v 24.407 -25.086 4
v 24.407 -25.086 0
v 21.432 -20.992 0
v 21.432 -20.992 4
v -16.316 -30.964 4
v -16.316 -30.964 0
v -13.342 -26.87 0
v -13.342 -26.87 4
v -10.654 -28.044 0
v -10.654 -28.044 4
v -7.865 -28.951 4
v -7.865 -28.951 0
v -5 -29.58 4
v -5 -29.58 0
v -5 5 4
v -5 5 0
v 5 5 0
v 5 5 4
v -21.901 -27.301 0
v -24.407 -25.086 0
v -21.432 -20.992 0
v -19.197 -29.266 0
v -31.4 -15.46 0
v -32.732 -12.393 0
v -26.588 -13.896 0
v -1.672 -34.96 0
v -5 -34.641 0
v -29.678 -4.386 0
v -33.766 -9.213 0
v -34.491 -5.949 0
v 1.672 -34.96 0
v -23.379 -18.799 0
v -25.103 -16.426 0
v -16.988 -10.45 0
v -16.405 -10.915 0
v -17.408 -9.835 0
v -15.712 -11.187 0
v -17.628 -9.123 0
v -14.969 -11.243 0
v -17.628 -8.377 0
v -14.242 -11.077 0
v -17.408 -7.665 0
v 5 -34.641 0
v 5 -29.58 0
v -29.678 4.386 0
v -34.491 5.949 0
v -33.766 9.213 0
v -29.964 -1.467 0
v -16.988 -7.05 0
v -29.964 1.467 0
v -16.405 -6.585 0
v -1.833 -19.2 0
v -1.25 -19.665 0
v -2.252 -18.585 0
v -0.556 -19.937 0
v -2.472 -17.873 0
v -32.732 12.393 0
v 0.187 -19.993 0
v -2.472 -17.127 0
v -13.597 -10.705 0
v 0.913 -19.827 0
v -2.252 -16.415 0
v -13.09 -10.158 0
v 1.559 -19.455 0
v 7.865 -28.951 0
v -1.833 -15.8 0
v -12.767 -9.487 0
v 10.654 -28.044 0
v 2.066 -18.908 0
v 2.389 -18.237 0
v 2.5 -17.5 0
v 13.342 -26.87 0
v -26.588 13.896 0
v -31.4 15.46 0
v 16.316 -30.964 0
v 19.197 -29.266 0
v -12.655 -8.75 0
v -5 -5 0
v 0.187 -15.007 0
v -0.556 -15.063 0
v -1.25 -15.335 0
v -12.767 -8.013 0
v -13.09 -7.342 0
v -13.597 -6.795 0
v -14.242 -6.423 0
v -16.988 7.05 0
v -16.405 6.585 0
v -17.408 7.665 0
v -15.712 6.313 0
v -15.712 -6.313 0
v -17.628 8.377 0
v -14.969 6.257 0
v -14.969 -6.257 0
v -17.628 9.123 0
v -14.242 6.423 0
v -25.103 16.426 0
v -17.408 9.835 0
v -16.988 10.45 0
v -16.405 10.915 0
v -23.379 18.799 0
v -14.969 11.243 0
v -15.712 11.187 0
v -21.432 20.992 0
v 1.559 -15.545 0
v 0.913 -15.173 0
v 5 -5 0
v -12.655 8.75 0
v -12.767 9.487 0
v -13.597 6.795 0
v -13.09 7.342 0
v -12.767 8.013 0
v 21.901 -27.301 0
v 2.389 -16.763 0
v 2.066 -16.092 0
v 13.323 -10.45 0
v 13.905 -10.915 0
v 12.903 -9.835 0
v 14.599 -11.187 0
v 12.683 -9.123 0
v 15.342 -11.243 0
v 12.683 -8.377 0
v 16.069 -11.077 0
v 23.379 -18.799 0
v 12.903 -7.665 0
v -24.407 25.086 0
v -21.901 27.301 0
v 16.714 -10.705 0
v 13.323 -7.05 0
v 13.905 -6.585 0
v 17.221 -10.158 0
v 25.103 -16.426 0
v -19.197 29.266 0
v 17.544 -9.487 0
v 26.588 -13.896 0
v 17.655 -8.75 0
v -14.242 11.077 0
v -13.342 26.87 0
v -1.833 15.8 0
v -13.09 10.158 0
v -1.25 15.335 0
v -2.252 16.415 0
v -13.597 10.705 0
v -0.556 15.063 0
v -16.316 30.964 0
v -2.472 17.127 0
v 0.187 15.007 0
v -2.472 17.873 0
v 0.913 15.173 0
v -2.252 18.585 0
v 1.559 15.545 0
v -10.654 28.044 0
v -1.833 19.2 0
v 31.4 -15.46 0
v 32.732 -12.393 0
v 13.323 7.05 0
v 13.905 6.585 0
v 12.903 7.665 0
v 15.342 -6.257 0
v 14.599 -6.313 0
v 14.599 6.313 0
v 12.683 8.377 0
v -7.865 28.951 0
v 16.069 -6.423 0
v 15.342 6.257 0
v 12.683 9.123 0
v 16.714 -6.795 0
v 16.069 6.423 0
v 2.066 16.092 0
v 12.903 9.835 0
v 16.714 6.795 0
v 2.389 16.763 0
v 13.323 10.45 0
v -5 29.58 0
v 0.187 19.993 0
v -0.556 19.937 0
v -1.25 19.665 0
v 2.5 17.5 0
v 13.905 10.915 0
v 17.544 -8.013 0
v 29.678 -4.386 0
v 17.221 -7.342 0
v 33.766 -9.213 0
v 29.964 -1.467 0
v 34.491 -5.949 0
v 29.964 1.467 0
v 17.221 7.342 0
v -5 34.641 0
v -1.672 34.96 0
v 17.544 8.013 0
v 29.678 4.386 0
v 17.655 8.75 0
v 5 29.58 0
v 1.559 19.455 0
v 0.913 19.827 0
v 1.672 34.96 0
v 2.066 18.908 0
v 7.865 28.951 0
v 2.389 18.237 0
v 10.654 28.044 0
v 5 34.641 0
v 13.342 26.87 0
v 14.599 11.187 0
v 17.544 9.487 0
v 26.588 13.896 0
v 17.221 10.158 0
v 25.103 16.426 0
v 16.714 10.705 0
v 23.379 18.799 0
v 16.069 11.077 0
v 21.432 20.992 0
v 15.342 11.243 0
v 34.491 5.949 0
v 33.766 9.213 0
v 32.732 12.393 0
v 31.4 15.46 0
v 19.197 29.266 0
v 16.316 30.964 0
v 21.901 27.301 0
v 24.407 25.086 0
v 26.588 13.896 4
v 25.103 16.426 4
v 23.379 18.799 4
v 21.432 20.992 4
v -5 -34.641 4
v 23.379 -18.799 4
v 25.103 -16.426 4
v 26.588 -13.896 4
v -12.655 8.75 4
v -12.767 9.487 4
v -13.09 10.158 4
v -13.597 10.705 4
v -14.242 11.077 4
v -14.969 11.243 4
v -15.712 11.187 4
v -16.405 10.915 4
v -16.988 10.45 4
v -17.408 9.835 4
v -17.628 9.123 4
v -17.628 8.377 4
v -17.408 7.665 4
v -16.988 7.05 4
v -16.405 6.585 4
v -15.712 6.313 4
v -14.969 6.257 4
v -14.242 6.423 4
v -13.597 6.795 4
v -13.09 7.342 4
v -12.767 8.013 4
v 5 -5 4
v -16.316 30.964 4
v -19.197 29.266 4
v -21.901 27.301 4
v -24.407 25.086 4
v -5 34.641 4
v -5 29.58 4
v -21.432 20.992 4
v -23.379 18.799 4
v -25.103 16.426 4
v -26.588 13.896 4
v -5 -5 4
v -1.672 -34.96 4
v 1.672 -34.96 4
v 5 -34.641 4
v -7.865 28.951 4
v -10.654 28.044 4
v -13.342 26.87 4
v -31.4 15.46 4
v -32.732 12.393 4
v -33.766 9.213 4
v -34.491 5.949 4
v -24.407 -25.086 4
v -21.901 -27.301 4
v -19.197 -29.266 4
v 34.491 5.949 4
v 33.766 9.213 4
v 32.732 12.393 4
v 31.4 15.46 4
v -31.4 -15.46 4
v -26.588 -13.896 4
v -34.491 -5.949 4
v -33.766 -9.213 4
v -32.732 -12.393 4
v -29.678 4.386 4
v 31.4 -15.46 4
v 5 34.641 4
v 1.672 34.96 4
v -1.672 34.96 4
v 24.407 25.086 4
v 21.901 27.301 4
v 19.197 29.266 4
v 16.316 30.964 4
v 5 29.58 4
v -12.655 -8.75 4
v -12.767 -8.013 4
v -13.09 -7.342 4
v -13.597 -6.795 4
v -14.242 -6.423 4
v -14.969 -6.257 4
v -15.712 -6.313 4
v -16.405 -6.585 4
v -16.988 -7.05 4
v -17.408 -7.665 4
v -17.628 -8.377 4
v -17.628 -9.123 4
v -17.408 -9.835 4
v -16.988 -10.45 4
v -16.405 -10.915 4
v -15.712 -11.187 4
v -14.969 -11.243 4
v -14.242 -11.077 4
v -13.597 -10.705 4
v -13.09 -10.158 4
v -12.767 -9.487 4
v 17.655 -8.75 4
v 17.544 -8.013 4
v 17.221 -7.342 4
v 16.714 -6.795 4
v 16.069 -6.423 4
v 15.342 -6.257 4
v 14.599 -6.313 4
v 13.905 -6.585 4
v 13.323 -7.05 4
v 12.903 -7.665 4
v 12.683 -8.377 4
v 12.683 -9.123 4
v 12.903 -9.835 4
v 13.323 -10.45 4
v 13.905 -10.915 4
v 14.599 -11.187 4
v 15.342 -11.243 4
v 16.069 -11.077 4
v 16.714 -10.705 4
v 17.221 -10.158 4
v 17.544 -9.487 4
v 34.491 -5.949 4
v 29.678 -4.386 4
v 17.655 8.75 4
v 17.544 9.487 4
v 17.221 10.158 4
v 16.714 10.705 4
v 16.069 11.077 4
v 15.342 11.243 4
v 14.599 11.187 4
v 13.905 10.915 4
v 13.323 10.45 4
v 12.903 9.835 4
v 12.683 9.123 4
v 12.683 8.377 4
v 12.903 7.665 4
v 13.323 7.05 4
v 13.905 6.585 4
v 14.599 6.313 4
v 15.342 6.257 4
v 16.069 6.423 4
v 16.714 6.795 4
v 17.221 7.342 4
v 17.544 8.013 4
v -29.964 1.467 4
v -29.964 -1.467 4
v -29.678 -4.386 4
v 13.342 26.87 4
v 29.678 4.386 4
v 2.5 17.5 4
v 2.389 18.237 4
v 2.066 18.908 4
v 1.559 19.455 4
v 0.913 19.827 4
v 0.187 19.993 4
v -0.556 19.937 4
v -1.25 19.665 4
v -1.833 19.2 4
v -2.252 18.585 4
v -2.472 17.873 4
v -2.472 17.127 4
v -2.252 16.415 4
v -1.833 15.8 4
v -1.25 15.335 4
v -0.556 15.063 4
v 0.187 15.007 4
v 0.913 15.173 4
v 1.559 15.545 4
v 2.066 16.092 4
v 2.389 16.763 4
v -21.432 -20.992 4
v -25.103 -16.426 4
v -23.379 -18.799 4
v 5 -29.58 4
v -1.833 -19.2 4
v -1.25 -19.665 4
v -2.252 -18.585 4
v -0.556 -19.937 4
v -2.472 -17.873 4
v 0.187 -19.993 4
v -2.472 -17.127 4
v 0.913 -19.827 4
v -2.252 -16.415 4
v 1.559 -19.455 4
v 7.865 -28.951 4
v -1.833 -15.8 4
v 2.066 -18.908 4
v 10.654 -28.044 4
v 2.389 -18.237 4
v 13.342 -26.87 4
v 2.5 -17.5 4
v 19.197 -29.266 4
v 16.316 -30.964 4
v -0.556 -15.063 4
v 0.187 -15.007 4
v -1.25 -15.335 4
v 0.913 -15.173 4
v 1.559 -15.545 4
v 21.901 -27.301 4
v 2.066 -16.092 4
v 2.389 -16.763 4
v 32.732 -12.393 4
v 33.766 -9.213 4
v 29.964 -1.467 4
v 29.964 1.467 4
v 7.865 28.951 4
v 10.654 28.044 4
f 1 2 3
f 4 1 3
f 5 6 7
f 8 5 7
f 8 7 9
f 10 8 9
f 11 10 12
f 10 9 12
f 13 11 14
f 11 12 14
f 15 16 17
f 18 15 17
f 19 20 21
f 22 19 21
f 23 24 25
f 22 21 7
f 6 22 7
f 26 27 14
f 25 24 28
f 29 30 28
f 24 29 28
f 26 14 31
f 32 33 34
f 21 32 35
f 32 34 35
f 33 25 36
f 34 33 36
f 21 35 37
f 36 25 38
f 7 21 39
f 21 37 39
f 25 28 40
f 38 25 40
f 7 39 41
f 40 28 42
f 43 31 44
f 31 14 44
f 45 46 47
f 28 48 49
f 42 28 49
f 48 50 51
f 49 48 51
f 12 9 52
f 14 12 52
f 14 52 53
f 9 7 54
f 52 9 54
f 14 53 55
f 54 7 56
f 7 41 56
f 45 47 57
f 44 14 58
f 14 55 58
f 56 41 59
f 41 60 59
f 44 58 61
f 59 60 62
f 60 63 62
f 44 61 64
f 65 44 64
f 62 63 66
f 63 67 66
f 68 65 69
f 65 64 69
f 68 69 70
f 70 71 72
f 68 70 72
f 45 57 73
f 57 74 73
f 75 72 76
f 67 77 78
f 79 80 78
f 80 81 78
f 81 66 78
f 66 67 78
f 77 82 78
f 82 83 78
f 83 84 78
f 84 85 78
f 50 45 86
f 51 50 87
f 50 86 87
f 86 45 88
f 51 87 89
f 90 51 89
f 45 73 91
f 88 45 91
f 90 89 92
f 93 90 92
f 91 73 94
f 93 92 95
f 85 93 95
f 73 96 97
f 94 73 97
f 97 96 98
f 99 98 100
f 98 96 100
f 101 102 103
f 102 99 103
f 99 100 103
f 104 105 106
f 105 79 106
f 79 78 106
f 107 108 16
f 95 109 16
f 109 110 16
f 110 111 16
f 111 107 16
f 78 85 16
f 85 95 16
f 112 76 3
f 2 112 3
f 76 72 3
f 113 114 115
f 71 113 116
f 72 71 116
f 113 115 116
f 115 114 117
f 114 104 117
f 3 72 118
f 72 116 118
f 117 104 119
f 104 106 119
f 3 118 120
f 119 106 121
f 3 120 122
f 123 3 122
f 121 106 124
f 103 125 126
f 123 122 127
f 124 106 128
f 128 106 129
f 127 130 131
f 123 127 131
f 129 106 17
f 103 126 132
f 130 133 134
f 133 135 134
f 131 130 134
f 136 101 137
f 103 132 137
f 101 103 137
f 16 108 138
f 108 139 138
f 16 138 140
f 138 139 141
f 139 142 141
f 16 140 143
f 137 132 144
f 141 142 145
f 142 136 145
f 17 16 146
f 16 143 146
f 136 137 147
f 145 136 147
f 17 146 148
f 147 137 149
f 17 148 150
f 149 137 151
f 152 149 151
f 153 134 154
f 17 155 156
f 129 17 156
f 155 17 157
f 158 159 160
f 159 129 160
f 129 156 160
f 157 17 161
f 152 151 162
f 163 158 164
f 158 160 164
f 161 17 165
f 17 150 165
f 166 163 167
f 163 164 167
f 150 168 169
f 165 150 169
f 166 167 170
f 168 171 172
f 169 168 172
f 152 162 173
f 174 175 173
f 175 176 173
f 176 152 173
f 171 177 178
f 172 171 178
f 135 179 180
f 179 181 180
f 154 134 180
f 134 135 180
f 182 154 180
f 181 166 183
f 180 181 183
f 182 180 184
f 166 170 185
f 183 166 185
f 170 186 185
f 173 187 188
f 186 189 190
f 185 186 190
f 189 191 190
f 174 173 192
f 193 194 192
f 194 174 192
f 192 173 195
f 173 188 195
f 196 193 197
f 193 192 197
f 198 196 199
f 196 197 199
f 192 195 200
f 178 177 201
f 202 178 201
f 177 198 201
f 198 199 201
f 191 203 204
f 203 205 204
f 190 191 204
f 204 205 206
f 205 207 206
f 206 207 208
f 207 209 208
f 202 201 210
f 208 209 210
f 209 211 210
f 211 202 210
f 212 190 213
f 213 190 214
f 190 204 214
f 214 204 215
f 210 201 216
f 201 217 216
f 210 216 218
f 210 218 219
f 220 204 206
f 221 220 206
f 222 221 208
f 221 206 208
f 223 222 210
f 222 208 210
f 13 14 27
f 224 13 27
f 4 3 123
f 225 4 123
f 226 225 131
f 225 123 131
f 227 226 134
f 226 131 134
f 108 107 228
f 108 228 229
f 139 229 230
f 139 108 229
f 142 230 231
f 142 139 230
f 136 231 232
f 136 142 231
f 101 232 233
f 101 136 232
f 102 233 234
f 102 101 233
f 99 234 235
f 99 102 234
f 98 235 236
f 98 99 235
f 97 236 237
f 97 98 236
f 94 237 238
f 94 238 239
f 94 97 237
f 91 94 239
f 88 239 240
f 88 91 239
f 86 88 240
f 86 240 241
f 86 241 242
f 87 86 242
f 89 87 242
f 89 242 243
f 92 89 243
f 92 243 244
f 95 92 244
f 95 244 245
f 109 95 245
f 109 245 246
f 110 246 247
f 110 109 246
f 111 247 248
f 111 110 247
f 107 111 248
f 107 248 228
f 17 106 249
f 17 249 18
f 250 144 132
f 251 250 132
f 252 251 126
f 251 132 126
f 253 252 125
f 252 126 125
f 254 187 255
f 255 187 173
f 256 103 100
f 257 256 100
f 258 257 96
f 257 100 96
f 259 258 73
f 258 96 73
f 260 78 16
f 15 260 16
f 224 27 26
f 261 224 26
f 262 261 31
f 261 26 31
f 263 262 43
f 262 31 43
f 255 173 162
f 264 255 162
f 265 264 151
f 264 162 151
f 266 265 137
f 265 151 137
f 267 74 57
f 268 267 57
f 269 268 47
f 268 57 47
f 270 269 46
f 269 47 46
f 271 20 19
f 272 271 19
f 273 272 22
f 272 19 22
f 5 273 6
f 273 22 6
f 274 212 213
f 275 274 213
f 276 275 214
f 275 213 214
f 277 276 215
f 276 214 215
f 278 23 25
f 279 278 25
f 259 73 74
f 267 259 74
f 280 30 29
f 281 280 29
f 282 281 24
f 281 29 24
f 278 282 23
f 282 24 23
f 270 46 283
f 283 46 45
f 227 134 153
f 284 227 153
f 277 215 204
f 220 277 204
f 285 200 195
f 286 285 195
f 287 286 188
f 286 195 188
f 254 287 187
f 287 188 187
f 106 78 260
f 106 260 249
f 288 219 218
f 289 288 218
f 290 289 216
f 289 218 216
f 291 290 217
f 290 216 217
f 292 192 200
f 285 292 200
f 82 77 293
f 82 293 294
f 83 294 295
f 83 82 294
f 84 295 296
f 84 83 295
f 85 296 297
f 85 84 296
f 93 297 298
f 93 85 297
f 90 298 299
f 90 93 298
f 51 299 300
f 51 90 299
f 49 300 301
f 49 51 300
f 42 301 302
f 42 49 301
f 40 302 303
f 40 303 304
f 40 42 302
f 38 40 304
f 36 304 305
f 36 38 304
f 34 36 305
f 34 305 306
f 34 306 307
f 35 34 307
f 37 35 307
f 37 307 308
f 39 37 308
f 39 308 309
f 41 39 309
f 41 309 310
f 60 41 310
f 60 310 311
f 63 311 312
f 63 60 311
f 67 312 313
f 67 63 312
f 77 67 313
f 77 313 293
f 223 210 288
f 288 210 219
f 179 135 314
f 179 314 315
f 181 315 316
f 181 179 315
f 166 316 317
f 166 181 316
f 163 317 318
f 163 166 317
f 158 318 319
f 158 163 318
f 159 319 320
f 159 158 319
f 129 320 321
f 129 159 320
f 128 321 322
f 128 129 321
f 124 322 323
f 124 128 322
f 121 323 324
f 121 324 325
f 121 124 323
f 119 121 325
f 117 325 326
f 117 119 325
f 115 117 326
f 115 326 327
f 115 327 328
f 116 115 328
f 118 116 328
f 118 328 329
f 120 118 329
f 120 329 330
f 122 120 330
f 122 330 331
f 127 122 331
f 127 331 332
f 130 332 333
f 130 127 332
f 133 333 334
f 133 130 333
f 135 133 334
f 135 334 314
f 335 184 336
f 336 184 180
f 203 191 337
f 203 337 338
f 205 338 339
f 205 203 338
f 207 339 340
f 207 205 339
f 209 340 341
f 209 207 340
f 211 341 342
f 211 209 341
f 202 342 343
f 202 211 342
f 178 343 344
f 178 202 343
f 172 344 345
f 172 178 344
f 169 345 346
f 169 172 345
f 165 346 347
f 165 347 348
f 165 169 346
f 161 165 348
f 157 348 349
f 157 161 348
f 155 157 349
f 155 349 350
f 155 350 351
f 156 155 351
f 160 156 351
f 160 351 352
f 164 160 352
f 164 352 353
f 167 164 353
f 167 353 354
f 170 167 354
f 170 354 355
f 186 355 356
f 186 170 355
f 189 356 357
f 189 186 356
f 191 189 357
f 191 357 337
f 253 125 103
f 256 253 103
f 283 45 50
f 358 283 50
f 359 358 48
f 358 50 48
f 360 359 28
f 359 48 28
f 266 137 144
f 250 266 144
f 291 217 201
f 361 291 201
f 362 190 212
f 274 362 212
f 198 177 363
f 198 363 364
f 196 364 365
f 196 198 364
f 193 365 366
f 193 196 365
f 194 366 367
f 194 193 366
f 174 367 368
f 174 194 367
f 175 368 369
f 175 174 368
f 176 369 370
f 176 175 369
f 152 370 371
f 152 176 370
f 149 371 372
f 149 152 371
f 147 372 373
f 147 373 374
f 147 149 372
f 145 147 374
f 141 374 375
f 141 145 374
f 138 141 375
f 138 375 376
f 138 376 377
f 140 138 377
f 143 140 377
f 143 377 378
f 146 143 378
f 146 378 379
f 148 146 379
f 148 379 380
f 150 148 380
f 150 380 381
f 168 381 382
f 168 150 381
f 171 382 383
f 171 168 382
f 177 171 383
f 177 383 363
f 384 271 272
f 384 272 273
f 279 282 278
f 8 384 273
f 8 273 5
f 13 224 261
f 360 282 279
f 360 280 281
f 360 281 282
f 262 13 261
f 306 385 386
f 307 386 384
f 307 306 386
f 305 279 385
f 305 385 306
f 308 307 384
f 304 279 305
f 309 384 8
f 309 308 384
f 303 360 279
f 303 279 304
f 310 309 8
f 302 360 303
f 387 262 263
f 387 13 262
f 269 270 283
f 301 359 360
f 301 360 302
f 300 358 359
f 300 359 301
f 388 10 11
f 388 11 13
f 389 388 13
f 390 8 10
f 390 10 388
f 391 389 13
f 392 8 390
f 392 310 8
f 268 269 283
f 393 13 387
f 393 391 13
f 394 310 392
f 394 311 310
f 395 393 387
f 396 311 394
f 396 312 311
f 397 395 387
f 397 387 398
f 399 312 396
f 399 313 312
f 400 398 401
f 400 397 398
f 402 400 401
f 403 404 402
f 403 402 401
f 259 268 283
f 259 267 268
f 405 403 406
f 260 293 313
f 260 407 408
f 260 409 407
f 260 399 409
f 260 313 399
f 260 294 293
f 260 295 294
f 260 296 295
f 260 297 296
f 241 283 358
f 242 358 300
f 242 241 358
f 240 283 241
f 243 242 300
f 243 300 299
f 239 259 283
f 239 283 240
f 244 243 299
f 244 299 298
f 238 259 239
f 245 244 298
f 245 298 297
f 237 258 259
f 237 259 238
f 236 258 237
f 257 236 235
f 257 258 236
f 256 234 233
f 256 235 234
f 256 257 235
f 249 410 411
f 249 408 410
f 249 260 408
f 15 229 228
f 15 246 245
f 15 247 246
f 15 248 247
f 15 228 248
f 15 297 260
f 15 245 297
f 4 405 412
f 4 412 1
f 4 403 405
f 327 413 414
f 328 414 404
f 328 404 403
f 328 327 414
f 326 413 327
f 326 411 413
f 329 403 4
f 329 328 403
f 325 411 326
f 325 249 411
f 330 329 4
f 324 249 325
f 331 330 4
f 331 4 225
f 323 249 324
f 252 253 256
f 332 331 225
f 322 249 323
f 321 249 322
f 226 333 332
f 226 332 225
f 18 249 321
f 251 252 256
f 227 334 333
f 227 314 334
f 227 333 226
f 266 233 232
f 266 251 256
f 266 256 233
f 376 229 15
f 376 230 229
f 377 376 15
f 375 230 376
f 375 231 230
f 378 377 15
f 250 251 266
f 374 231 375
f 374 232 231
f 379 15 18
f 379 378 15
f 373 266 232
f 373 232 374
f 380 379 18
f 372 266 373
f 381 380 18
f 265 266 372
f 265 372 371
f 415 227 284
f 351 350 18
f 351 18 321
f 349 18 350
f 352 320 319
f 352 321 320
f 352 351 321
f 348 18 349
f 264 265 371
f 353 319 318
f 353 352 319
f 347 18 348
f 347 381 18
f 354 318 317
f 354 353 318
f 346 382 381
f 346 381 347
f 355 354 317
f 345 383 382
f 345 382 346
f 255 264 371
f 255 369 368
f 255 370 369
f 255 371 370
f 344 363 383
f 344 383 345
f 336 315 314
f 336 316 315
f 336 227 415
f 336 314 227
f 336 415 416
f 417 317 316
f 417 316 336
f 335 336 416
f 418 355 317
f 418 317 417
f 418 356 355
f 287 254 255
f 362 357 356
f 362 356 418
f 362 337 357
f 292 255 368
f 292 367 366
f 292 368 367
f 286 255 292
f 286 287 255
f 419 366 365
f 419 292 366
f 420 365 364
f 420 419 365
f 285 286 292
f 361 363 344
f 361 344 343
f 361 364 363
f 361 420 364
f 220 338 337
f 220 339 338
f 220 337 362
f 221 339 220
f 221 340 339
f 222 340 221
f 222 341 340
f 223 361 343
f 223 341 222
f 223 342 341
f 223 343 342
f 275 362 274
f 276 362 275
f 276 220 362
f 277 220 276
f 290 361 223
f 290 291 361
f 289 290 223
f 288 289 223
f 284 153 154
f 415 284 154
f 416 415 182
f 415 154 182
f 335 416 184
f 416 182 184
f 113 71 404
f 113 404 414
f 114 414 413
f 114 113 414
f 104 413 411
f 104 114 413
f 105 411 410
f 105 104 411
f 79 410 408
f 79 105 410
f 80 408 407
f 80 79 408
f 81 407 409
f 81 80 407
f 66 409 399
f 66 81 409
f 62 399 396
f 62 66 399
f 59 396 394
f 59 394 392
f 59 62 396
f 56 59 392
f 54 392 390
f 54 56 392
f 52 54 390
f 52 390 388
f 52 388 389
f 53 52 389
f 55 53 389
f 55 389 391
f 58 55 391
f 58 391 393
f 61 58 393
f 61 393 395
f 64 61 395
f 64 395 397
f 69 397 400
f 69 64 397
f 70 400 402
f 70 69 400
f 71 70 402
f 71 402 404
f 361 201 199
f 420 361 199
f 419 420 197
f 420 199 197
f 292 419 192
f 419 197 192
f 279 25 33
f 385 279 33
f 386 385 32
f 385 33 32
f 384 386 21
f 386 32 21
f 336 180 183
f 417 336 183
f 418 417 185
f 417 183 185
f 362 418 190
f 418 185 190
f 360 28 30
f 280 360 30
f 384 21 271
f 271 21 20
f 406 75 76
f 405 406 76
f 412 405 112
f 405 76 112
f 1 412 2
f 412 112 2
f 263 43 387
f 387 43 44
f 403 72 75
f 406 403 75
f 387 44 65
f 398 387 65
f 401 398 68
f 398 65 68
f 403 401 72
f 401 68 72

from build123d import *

# Parameters (mm, degrees)
SKETCH1_R           = 2.5
SKETCH1_W           = 10
SKETCH1_H           = 10
BOSS_EXTRUDE1_DEPTH = 4


with BuildPart() as part:
    # Sketch1 → Boss-Extrude1 (new body)
    with BuildSketch(Plane.XY):
        with BuildLine():
            Line((5, 29.580398915), (5, 34.641016151))
            ThreePointArc((5, 34.641016151), (0, 35), (-5, 34.641016151))
            Line((-5, 34.641016151), (-5, 29.580398915))
            ThreePointArc((-5, 29.580398915), (-9.270509831, 28.531695489), (-13.341837268, 26.869971684))
            Line((-13.341837268, 26.869971684), (-16.316393446, 30.96409703))
            ThreePointArc((-16.316393446, 30.96409703), (-20.57248383, 28.315594803), (-24.40656339, 25.086244507))
            Line((-24.40656339, 25.086244507), (-21.432007211, 20.992119162))
            ThreePointArc((-21.432007211, 20.992119162), (-24.270509831, 17.633557569), (-26.587546171, 13.896128547))
            Line((-26.587546171, 13.896128547), (-31.40047917, 15.459945275))
            ThreePointArc((-31.40047917, 15.459945275), (-33.28697807, 10.815594803), (-34.490649114, 5.949380112))
            Line((-34.490649114, 5.949380112), (-29.677716115, 4.385563384))
            ThreePointArc((-29.677716115, 4.385563384), (-30, 0), (-29.677716115, -4.385563384))
            Line((-29.677716115, -4.385563384), (-34.490649114, -5.949380112))
            ThreePointArc((-34.490649114, -5.949380112), (-33.28697807, -10.815594803), (-31.40047917, -15.459945275))
            Line((-31.40047917, -15.459945275), (-26.587546171, -13.896128547))
            ThreePointArc((-26.587546171, -13.896128547), (-24.270509831, -17.633557569), (-21.432007211, -20.992119162))
            Line((-21.432007211, -20.992119162), (-24.40656339, -25.086244507))
            ThreePointArc((-24.40656339, -25.086244507), (-20.57248383, -28.315594803), (-16.316393446, -30.96409703))
            Line((-16.316393446, -30.96409703), (-13.341837268, -26.869971684))
            ThreePointArc((-13.341837268, -26.869971684), (-9.270509831, -28.531695489), (-5, -29.580398915))
            Line((-5, -29.580398915), (-5, -34.641016151))
            ThreePointArc((-5, -34.641016151), (0, -35), (5, -34.641016151))
            Line((5, -34.641016151), (5, -29.580398915))
            ThreePointArc((5, -29.580398915), (9.270509831, -28.531695489), (13.341837268, -26.869971684))
            Line((13.341837268, -26.869971684), (16.316393446, -30.96409703))
            ThreePointArc((16.316393446, -30.96409703), (20.57248383, -28.315594803), (24.40656339, -25.086244507))
            Line((24.40656339, -25.086244507), (21.432007211, -20.992119162))
            ThreePointArc((21.432007211, -20.992119162), (24.270509831, -17.633557569), (26.587546171, -13.896128547))
            Line((26.587546171, -13.896128547), (31.40047917, -15.459945275))
            ThreePointArc((31.40047917, -15.459945275), (33.28697807, -10.815594803), (34.490649114, -5.949380112))
            Line((34.490649114, -5.949380112), (29.677716115, -4.385563384))
            ThreePointArc((29.677716115, -4.385563384), (30, 0), (29.677716115, 4.385563384))
            Line((29.677716115, 4.385563384), (34.490649114, 5.949380112))
            ThreePointArc((34.490649114, 5.949380112), (33.28697807, 10.815594803), (31.40047917, 15.459945275))
            Line((31.40047917, 15.459945275), (26.587546171, 13.896128547))
            ThreePointArc((26.587546171, 13.896128547), (24.270509831, 17.633557569), (21.432007211, 20.992119162))
            Line((21.432007211, 20.992119162), (24.40656339, 25.086244507))
            ThreePointArc((24.40656339, 25.086244507), (20.57248383, 28.315594803), (16.316393446, 30.96409703))
            Line((16.316393446, 30.96409703), (13.341837268, 26.869971684))
            ThreePointArc((13.341837268, 26.869971684), (9.270509831, 28.531695489), (5, 29.580398915))
        make_face()
        with Locations((0, 17.5)):
            Circle(SKETCH1_R, mode=Mode.SUBTRACT)
        with Locations((15.155444566, 8.75)):
            Circle(SKETCH1_R, mode=Mode.SUBTRACT)
        with Locations((15.155444566, -8.75)):
            Circle(SKETCH1_R, mode=Mode.SUBTRACT)
        with Locations((0, -17.5)):
            Circle(SKETCH1_R, mode=Mode.SUBTRACT)
        with Locations((-15.155444566, -8.75)):
            Circle(SKETCH1_R, mode=Mode.SUBTRACT)
        with Locations((-15.155444566, 8.75)):
            Circle(SKETCH1_R, mode=Mode.SUBTRACT)
        Rectangle(SKETCH1_W, SKETCH1_H, mode=Mode.SUBTRACT)
    extrude(amount=BOSS_EXTRUDE1_DEPTH)


solid = part.part
